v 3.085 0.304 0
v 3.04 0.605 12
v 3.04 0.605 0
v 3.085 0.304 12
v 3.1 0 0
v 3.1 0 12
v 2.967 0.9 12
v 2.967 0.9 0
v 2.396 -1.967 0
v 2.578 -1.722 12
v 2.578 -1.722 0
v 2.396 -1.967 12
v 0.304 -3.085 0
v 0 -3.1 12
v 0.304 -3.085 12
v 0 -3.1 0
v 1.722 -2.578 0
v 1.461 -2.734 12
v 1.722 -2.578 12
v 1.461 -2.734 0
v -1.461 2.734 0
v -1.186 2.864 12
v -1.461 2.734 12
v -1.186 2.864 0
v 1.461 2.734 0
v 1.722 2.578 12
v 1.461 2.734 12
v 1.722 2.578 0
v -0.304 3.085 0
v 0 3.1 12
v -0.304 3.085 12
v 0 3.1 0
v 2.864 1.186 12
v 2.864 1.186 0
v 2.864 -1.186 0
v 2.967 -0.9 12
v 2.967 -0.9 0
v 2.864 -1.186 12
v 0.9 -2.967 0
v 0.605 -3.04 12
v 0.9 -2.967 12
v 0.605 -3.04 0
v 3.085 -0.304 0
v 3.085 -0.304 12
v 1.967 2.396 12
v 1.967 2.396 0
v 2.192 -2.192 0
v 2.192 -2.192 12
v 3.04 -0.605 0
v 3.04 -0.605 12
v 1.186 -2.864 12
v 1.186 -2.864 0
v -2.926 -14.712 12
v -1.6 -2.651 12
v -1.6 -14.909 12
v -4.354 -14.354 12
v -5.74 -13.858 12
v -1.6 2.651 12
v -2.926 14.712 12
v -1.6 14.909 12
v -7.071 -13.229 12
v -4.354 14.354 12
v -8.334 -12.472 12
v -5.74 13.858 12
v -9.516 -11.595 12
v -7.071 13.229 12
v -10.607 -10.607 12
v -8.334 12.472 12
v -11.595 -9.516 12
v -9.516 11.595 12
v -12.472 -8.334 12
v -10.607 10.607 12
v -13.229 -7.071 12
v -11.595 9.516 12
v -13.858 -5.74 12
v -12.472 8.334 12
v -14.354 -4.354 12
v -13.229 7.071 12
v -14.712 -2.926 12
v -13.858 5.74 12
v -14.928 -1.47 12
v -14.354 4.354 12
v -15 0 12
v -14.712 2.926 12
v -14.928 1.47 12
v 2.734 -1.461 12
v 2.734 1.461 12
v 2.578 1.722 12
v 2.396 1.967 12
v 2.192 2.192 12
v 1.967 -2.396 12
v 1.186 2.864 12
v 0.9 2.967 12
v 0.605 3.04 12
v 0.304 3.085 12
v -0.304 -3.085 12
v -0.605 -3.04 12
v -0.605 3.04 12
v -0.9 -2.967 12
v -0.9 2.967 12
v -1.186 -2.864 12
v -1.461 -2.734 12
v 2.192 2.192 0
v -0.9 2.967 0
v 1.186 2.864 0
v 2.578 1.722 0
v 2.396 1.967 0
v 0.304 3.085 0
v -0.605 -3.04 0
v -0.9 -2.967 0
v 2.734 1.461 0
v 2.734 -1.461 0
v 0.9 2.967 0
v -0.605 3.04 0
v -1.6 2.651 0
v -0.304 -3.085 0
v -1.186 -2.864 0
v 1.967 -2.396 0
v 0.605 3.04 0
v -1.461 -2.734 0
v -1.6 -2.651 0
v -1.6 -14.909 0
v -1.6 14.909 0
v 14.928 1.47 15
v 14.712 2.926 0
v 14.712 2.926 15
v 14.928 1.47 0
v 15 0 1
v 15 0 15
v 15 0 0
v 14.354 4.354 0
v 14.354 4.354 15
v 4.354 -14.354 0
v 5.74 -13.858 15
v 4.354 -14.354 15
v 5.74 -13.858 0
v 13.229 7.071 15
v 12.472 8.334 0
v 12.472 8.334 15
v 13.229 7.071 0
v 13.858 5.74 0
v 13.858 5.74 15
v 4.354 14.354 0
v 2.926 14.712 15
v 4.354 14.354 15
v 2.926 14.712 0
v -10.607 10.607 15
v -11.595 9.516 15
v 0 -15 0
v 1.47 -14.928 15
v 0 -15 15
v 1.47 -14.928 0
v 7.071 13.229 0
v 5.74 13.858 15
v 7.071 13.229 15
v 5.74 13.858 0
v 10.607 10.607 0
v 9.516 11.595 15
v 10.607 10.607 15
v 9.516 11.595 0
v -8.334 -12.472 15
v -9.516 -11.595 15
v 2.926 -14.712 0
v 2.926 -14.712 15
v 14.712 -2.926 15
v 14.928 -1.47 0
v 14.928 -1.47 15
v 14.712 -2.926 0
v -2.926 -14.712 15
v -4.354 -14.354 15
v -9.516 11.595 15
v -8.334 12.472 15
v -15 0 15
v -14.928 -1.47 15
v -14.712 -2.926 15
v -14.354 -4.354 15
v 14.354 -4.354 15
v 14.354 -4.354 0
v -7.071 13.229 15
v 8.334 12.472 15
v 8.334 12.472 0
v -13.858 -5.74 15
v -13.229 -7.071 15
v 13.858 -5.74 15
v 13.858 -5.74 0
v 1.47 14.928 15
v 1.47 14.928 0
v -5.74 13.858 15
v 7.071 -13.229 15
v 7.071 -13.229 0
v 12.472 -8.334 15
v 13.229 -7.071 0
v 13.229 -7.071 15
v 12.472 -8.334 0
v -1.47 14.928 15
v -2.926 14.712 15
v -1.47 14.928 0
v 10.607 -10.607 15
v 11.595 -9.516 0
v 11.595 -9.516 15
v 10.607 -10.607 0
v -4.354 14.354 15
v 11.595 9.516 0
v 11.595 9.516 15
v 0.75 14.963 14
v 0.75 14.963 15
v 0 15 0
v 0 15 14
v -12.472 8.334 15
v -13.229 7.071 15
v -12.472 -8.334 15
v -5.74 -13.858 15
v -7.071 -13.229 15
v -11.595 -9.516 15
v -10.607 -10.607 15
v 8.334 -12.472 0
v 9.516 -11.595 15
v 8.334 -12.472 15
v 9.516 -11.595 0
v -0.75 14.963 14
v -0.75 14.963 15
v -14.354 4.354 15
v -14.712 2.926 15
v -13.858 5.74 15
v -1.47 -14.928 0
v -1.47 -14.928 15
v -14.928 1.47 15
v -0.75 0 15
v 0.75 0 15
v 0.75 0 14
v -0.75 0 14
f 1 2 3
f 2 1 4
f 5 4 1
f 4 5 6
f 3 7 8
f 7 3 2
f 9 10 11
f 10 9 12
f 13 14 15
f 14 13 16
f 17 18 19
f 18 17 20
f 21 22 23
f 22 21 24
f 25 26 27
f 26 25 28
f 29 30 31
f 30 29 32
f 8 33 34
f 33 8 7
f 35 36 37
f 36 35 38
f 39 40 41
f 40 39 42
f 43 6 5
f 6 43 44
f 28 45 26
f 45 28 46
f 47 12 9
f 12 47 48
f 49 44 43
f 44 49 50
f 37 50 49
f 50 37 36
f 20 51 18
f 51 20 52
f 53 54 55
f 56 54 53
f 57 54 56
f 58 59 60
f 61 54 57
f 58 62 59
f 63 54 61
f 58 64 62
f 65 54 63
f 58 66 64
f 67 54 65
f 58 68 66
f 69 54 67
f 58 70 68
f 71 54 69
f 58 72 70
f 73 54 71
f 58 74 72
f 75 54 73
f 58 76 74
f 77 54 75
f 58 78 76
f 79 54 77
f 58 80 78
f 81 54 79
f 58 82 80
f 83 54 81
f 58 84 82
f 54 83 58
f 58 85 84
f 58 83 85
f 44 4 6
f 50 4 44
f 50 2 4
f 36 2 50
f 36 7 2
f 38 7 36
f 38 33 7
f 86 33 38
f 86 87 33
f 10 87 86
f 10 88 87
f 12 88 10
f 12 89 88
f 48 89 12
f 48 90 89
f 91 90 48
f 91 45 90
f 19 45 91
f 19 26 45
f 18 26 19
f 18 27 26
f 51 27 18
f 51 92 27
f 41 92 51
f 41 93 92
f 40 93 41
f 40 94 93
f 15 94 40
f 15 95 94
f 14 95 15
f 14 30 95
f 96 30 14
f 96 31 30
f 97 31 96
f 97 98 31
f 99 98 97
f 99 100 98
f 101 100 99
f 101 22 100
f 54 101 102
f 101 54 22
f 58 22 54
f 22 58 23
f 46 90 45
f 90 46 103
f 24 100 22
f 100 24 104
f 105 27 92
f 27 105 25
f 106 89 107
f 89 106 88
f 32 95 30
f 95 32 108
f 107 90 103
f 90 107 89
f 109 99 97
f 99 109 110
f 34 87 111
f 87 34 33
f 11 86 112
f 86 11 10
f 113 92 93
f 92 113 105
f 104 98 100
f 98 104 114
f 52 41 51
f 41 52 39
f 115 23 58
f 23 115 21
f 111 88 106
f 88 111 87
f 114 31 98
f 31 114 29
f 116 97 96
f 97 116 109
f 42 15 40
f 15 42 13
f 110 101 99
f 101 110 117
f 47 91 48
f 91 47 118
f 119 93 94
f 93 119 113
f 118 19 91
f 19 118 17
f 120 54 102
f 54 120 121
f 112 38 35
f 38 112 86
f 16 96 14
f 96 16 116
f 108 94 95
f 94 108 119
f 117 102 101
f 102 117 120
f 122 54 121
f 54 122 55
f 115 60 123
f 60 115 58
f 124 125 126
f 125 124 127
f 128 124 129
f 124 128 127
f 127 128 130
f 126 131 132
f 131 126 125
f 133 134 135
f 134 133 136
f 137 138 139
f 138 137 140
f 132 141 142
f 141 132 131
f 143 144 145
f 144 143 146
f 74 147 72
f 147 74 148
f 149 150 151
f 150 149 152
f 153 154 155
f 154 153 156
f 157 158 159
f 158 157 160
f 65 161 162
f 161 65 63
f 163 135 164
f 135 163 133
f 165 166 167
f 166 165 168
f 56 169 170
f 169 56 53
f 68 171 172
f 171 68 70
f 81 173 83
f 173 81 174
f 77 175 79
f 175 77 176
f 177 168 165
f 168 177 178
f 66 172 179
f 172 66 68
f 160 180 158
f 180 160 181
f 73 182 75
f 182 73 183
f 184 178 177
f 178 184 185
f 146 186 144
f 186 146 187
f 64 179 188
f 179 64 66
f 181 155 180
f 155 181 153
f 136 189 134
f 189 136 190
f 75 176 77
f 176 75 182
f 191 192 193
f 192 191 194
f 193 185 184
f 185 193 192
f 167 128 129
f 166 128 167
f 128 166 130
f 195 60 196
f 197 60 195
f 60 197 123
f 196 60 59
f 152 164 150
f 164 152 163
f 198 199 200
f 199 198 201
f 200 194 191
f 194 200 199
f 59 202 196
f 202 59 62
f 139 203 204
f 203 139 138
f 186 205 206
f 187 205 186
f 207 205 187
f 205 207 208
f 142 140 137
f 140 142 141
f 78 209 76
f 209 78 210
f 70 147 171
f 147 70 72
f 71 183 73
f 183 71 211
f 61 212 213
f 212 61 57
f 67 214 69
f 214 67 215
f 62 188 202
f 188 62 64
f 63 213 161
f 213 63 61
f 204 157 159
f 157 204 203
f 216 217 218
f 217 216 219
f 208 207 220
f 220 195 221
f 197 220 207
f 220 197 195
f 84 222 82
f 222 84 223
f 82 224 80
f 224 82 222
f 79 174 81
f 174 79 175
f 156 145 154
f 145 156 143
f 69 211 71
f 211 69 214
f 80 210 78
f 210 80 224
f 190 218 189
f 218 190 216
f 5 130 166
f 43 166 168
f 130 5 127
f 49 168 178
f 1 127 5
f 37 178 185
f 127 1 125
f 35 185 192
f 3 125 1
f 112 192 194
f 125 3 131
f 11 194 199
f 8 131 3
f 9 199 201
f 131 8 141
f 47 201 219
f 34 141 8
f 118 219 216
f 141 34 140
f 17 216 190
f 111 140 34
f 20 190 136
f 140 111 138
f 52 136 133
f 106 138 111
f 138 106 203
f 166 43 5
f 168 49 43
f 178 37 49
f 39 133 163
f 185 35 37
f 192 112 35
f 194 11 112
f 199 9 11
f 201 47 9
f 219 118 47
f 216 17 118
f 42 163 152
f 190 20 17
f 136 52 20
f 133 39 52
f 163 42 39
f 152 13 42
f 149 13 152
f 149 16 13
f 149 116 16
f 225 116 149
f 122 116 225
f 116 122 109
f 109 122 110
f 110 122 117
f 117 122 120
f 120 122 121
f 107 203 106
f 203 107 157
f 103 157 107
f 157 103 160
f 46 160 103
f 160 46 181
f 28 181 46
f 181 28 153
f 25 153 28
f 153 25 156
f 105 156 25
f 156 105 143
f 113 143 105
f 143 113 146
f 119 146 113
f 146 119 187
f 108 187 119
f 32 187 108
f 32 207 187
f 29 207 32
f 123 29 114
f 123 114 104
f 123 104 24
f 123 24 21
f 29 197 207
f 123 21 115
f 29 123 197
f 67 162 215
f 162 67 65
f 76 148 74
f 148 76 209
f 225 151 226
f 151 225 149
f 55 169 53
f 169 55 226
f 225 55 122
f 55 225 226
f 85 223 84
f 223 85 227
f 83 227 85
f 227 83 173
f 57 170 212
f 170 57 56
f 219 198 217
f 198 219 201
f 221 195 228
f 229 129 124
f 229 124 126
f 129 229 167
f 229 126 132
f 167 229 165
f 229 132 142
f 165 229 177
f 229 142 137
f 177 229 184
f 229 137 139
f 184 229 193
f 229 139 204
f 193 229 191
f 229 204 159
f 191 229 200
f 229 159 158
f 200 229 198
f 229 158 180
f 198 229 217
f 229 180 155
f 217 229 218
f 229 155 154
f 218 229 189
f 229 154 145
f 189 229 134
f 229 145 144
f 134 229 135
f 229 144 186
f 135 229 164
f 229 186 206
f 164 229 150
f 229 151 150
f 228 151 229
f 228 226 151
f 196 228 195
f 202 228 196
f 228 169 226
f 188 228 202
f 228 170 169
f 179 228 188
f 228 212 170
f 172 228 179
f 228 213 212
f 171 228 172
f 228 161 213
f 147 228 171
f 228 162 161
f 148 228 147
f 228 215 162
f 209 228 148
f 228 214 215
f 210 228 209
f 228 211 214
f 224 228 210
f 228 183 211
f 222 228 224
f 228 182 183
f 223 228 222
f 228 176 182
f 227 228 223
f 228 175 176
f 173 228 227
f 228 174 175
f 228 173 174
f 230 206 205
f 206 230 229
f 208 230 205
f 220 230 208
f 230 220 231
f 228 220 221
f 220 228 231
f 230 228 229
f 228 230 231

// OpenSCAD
// Replacement knob for a hotplate stirrer with a 6 mm D-shaft.
// Designed for FDM printing, resting on the bottom face (z=0).

// --- Dimensions ---
knob_diameter = 30.0;      // Total diameter of the knob
knob_height   = 15.0;      // Total height of the knob
d_shaft_dia    = 6.2;       // Diameter of the circular part of the D-shaft
d_shaft_width  = 4.7;       // Distance from the flat to the opposite side
d_shaft_depth  = 12.0;      // Depth of the D-shaft bore into the knob

groove_dia     = 2.0;       // Diameter of the vertical grip grooves
num_grooves    = 18;        // Number of vertical grip grooves

pointer_width  = 1.5;       // Width of the pointer groove on top
pointer_depth  = 1.0;       // Depth of the pointer groove

$fn = 64;

// --- Calculations ---
// The distance from the center to the flat side:
// Since the distance from the flat to the opposite side is 4.7,
// and the radius is 6.2 / 2 = 3.1,
// the distance from the center to the flat is 4.7 - 3.1 = 1.6.
dist_center_to_flat = d_shaft_width - (d_shaft_dia / 2);

// --- Modeling ---

difference() {
    // 1. Main Knob Body
    cylinder(h = knob_height, d = knob_diameter);

    // 2. D-shaped Blind Bore
    // We subtract a cylinder and then subtract a block to create the flat side.
    // The flat side is located at x = -dist_center_to_flat.
    // To ensure a clean cut, we make the block wider than the knob.
    translate([0, 0, -0.01]) {
        // The circular part of the bore
        cylinder(h = d_shaft_depth + 0.01, d = d_shaft_dia);
        
        // The flat part of the bore (subtracting a block to create the flat)
        // The block covers the area from the center towards the edge.
        // We position it so the edge of the block is at -dist_center_to_flat.
        translate([-knob_diameter, -knob_diameter, -0.01])
            cube([knob_diameter - dist_center_to_flat, knob_diameter * 2, d_shaft_depth + 0.02]);
    }

    // 3. Vertical Grip Grooves
    // 18 evenly spaced vertical grooves around the outside.
    // Each groove is a 2mm diameter half-cylinder.
    for (i = [0 : num_grooves - 1]) {
        angle = i * (360 / num_grooves);
        rotate([0, 0, angle])
            // Translate the cylinder so its edge is at the knob's edge
            // The center of the 2mm cylinder is at (knob_diameter/2) - (groove_dia/2)
            translate([(knob_diameter / 2), 0, 0])
                rotate([0, 90, 0])
                    cylinder(h = knob_height + 2, d = groove_dia);
    }

    // 4. Top Pointer Groove
    // 1.5mm wide, 1mm deep, runs from center to edge, on the same side as the flat.
    // The flat is at x = -dist_center_to_flat.
    // To align with the "same side as the flat", we place the groove on the negative X axis.
    translate([-pointer_width / 2, 0, knob_height - pointer_depth])
        cube([pointer_width, knob_diameter, pointer_depth + 0.01]);
}

// Note on Pointer Groove: 
// The user requested it to run from center to edge. 
// A simple cube subtraction is used here. 
// To ensure it is "on the same side as the flat", 
// we center it on the X-axis (which is the direction of the flat).
